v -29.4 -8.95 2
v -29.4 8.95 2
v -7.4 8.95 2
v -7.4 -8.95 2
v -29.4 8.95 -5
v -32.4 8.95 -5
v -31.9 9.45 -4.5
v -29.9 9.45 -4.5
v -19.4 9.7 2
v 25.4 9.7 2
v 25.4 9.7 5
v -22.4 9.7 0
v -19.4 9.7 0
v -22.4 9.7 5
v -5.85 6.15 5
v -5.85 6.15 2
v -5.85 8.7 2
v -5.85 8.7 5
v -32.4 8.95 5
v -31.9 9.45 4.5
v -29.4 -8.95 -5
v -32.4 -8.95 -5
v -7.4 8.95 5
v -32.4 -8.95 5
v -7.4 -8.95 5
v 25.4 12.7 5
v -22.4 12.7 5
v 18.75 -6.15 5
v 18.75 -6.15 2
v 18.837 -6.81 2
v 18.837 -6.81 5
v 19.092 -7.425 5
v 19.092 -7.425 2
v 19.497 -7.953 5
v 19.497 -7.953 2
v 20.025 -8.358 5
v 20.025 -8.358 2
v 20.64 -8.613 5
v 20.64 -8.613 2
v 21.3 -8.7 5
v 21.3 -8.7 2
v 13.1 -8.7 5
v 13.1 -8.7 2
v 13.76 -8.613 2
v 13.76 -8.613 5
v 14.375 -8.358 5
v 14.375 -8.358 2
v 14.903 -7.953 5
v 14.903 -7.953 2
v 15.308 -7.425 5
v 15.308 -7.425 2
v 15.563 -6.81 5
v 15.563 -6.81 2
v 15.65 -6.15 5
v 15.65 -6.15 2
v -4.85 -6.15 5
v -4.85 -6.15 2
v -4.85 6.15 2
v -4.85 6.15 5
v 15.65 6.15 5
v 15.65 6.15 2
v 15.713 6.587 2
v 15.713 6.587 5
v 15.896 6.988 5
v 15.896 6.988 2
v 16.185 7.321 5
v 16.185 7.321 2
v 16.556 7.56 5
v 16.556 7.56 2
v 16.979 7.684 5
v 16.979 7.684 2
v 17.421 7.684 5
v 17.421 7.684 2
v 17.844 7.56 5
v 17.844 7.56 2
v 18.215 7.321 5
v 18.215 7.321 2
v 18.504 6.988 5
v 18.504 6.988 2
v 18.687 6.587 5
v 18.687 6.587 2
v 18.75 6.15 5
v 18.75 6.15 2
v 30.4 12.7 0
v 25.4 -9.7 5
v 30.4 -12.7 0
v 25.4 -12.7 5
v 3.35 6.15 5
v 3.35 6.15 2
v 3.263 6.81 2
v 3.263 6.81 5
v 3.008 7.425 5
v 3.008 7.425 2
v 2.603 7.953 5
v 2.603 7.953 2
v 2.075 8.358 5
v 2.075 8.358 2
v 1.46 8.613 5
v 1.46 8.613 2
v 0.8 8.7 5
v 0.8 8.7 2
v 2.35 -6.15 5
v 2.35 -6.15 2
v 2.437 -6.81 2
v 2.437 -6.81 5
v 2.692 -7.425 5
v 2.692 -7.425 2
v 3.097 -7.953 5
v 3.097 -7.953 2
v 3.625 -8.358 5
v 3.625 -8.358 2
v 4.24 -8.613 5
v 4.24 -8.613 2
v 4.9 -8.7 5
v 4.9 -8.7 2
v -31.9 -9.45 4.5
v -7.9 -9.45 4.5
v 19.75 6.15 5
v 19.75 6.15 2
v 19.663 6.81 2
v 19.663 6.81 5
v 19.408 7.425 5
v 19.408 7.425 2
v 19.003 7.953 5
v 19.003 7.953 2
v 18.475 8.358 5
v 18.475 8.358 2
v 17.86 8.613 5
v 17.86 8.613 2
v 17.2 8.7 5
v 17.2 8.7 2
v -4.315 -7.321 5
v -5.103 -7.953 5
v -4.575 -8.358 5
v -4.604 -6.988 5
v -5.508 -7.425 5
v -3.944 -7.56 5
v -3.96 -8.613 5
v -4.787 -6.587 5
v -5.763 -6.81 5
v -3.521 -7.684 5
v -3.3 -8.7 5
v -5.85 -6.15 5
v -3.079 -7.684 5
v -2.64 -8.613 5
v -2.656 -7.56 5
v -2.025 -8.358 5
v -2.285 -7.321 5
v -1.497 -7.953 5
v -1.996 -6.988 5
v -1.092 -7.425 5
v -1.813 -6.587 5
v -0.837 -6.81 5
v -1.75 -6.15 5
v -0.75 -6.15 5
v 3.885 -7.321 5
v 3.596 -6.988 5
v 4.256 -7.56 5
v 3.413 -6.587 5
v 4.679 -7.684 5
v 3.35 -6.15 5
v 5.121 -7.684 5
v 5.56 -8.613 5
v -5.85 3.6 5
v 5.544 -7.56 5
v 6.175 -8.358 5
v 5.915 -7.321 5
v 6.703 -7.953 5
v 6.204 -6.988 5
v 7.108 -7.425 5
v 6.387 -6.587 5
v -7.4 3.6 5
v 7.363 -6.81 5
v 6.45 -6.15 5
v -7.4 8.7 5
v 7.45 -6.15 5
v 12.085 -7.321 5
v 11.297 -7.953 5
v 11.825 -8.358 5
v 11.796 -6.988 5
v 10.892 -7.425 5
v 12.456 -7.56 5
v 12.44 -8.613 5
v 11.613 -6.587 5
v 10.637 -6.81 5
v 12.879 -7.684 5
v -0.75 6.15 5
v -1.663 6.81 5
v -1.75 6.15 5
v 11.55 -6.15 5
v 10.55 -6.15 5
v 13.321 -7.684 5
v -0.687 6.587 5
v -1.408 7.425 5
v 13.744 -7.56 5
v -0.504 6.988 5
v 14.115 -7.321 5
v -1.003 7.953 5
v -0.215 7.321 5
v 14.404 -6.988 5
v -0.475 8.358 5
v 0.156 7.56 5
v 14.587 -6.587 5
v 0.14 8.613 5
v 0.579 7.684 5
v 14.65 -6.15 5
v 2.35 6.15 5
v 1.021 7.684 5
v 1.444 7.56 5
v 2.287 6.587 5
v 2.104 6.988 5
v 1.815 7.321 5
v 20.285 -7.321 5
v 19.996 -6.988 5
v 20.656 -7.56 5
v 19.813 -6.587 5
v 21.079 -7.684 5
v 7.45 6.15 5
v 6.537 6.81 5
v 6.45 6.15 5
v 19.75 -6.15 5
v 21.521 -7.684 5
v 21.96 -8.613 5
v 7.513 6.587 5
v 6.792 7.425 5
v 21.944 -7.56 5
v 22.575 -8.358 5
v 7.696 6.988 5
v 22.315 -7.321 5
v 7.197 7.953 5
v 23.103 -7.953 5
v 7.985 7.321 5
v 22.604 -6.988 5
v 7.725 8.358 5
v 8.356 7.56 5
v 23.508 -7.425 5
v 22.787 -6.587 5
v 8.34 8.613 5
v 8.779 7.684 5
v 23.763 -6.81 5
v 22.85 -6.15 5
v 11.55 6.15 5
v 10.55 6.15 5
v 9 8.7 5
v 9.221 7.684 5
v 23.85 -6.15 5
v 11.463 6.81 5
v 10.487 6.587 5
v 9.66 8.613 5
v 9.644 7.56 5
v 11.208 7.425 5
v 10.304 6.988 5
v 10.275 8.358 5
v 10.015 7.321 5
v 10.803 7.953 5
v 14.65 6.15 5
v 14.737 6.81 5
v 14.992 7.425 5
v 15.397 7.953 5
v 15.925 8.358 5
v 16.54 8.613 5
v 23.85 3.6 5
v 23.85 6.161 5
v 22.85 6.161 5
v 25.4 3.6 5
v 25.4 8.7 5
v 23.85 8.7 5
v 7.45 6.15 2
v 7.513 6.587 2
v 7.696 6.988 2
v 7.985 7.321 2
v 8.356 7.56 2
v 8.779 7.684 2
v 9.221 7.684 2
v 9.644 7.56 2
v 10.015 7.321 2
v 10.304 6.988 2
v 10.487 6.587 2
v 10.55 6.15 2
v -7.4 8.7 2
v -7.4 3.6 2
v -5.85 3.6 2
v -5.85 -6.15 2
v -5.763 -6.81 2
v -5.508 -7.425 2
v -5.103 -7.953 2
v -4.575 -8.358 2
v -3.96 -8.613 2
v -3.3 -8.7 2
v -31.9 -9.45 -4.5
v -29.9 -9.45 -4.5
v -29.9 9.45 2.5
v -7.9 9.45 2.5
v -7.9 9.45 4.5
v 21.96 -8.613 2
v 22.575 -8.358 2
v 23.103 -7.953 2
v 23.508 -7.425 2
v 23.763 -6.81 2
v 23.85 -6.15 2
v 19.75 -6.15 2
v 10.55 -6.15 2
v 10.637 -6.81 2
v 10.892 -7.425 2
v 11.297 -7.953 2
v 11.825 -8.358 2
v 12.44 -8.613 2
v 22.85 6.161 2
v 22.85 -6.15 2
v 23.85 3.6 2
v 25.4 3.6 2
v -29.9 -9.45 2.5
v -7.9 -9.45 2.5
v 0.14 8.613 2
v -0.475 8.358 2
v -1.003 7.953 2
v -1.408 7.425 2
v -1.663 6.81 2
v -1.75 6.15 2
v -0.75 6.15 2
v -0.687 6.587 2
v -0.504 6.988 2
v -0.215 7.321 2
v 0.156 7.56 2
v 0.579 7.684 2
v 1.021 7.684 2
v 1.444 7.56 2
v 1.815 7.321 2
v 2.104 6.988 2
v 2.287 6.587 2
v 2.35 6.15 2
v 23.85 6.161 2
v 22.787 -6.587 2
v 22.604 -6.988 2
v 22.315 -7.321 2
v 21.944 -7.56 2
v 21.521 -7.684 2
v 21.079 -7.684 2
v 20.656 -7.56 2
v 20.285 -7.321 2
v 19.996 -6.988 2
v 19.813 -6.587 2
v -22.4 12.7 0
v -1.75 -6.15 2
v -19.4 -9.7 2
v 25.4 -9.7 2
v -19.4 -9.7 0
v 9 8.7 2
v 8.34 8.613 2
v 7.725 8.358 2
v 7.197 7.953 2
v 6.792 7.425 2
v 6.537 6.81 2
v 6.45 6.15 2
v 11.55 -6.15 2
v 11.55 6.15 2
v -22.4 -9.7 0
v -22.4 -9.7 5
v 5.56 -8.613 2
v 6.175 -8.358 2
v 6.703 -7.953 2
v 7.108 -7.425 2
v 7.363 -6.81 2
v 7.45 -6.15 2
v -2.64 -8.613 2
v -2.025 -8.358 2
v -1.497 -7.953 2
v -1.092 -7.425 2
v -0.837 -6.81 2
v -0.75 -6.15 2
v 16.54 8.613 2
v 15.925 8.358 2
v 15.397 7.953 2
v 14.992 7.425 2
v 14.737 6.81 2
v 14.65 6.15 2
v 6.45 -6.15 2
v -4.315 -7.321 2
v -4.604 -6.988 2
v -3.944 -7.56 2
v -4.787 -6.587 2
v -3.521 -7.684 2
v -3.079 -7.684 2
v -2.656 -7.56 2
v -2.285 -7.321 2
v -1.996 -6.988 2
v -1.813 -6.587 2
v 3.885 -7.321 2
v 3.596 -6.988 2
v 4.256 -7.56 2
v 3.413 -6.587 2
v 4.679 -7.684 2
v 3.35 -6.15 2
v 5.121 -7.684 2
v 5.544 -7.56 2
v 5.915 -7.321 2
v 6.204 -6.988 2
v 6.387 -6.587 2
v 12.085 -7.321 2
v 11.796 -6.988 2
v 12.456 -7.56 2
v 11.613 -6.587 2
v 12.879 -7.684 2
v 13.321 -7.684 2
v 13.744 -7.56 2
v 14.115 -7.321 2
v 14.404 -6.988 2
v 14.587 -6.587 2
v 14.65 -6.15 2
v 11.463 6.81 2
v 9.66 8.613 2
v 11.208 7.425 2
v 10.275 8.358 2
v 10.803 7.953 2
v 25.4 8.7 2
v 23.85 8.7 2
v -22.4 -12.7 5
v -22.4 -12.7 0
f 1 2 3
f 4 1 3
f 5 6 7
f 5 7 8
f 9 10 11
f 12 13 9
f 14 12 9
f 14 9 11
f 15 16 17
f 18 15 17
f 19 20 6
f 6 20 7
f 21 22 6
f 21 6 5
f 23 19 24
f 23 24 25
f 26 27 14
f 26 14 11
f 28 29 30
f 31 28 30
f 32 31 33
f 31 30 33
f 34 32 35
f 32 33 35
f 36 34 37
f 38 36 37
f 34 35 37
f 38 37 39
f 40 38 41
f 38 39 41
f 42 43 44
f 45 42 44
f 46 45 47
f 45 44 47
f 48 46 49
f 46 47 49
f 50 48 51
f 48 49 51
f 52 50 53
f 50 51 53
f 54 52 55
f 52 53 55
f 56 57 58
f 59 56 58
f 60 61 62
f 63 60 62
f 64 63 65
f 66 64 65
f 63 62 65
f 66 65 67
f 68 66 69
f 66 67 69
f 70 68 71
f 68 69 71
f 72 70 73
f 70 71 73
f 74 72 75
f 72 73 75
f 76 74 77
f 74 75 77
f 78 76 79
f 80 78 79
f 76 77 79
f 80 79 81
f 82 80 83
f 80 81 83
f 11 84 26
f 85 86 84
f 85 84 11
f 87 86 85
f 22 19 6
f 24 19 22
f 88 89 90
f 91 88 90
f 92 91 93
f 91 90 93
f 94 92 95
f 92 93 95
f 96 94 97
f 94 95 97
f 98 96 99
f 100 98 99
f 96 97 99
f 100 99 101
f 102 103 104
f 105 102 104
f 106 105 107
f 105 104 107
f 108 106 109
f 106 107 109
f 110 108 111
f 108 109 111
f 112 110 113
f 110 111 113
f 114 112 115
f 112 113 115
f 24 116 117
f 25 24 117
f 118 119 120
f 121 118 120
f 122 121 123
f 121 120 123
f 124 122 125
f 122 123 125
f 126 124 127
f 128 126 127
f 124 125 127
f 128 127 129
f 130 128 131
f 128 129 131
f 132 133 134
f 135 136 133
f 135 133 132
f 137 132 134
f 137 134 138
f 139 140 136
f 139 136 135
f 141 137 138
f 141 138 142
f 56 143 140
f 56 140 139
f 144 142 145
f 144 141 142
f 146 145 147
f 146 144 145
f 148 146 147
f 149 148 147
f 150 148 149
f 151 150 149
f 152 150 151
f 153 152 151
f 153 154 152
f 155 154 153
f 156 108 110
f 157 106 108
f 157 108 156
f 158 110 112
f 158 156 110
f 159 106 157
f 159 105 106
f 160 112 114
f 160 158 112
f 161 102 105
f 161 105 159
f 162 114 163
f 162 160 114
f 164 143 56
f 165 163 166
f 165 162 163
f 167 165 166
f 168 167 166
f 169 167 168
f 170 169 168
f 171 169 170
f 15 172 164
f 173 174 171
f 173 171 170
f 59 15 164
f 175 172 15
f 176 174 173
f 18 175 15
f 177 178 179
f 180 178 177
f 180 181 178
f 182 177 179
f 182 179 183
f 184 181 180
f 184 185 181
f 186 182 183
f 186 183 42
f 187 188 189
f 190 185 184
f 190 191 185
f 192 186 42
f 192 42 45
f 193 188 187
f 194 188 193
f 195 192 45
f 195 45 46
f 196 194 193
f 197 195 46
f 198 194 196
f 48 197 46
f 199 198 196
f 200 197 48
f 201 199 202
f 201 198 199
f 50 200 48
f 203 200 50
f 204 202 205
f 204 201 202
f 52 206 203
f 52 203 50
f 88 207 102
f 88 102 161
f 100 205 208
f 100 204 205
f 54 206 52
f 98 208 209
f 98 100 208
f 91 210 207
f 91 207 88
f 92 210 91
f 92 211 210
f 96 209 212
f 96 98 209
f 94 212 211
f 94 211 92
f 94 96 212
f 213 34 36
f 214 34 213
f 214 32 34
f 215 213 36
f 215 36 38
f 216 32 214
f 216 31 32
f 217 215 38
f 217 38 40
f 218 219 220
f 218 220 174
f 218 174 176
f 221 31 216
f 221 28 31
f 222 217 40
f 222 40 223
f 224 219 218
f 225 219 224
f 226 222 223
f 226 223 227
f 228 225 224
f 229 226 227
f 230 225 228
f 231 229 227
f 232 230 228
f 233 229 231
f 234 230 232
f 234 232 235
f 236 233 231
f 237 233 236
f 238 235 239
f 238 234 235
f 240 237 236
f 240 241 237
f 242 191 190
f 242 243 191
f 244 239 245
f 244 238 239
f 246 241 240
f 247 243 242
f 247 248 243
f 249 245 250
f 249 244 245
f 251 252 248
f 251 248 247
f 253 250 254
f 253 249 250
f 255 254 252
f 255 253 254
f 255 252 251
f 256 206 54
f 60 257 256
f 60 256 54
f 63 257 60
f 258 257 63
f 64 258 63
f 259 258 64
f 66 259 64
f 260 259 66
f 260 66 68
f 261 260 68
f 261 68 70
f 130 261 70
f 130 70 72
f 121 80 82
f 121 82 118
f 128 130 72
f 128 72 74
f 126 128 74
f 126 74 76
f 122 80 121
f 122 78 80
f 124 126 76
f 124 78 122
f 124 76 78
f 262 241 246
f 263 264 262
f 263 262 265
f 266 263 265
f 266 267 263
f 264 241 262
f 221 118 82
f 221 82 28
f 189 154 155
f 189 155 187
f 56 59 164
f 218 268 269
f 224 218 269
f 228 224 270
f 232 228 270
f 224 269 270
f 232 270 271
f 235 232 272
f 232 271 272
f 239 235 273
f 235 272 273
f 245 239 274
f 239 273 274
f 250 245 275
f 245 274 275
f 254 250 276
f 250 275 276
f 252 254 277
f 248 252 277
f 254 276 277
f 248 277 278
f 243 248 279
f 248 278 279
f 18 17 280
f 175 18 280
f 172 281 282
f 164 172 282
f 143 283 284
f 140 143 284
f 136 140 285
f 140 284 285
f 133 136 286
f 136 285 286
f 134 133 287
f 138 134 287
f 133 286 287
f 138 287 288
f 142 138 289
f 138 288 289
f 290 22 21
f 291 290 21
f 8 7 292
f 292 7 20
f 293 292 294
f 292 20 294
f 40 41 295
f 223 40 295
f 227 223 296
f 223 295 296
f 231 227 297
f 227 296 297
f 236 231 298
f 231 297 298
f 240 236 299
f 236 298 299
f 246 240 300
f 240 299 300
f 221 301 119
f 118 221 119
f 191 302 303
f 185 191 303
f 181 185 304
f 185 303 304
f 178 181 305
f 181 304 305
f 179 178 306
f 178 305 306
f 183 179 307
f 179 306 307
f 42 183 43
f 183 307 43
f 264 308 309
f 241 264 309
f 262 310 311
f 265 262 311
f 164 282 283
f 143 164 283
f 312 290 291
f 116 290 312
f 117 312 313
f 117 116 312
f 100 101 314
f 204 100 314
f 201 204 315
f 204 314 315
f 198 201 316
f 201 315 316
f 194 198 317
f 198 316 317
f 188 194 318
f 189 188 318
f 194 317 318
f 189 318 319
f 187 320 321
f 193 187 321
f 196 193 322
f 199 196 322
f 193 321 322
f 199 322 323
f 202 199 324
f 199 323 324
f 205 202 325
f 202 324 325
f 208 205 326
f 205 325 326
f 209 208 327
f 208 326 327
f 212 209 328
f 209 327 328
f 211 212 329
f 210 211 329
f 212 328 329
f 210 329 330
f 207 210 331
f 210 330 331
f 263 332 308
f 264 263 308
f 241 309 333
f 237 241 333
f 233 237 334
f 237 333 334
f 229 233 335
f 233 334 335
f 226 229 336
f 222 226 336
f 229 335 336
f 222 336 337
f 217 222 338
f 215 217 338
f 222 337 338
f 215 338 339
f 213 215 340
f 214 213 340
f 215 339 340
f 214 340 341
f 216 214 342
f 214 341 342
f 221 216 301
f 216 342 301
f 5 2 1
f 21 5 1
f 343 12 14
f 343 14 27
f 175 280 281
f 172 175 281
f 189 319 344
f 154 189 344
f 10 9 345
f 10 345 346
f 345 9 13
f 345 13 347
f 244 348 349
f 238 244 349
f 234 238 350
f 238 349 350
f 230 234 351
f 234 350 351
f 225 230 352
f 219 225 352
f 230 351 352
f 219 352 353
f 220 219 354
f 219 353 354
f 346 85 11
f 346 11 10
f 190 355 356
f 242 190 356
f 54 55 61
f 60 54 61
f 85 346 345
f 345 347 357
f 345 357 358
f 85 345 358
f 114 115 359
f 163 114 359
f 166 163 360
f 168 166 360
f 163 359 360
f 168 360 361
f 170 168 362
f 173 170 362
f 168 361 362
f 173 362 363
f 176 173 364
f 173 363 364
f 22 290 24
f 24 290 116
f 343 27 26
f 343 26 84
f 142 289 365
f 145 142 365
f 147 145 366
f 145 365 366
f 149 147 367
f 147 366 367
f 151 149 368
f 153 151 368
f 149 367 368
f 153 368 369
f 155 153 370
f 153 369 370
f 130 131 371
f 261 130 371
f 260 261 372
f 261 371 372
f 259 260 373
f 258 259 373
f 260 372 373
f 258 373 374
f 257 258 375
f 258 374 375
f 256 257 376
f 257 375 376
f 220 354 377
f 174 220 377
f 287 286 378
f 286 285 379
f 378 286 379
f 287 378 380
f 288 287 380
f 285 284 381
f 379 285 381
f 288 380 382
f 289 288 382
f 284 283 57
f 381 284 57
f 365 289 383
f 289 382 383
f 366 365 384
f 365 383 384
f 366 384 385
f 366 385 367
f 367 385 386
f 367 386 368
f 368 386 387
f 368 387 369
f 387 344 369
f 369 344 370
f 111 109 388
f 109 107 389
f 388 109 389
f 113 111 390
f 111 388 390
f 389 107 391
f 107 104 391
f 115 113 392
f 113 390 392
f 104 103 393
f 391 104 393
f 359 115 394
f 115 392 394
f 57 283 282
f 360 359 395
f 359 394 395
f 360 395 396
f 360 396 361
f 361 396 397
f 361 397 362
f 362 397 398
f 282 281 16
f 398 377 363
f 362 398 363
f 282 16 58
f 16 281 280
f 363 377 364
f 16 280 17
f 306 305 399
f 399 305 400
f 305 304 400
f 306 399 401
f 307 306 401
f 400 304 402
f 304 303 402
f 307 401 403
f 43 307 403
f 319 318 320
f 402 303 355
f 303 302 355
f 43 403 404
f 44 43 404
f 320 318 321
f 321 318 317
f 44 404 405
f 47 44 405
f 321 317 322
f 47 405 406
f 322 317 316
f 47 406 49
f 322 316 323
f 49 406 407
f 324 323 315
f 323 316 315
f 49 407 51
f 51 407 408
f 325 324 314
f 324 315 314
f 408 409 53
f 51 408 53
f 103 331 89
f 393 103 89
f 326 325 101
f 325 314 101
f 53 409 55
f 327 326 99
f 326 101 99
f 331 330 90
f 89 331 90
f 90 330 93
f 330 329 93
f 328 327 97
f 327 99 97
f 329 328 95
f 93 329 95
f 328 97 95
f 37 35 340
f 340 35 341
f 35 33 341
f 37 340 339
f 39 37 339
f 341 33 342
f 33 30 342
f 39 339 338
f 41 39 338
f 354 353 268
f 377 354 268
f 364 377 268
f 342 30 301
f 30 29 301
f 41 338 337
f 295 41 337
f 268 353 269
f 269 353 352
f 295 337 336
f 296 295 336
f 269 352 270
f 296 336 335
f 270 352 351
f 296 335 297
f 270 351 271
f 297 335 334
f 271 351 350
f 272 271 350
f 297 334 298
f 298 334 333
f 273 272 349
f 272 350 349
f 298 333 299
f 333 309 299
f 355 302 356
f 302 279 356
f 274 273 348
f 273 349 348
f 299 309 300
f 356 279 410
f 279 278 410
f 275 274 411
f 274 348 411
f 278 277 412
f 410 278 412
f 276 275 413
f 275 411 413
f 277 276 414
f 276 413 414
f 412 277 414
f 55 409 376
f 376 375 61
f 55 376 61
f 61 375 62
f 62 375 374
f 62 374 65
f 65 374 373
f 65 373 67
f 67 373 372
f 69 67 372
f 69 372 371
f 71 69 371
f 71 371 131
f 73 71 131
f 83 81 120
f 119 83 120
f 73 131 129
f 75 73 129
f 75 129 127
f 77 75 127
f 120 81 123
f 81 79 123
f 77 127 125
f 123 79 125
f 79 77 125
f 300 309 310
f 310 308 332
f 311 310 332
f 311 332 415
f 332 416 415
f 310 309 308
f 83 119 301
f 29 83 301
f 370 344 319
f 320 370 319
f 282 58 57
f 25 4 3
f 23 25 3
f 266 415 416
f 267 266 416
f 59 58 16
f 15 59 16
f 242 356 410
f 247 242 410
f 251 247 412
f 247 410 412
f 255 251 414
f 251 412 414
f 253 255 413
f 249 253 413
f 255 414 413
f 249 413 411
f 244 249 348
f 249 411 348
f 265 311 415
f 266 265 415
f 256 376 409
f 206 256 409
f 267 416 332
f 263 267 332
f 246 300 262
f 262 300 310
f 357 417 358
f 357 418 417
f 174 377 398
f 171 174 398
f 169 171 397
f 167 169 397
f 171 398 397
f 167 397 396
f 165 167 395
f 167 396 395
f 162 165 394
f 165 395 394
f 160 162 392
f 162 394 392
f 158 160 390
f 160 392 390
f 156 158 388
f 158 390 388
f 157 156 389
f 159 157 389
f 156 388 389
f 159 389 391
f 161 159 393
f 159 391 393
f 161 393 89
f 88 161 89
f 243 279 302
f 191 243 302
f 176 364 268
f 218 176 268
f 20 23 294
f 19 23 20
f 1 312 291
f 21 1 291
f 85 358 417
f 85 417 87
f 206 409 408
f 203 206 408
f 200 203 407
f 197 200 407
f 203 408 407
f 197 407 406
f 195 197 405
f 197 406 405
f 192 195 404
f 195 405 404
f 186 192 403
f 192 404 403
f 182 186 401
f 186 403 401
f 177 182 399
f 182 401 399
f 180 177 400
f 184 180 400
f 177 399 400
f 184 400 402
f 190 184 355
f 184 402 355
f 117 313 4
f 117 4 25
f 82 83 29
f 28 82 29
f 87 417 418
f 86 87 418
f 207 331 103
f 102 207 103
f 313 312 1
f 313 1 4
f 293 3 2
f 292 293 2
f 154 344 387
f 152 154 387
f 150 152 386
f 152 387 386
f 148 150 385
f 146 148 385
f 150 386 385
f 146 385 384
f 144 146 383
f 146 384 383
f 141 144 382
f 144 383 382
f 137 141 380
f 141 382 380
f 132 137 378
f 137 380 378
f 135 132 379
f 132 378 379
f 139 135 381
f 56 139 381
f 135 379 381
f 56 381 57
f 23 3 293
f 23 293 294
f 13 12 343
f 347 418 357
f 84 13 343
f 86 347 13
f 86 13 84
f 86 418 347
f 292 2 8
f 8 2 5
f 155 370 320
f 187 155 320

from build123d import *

# Parameters (mm, degrees)
F0_W      = 50.8
F0_H      = 25.4
F1_DEPTH  = 2
F2_W      = 50.8
F2_H      = 3
F3_DEPTH  = 3
F5_DEPTH  = 25.4
F6_DEPTH  = 3
F7_W      = 19.4
F7_H      = 2
F8_DEPTH  = 3
F9_W      = 13
F9_H      = 18.9
F9_W_2    = 12
F10_DEPTH = 3
F11_W     = 3
F11_H     = 18.9
F12_DEPTH = 7
F14_DEPTH = 3
F15_SIZE  = 0.5


with BuildPart() as f1:
    # F0 (on Top) → F1 (new body)
    with BuildSketch(Plane.XY):
        Rectangle(F0_W, F0_H)
    extrude(amount=F1_DEPTH)

    # F2 (on face) → F3 (join)
    with BuildSketch(Plane.XY.offset(2)):
        with Locations((0, 11.2)):
            Rectangle(F2_W, F2_H)
        with Locations((0, -11.2)):
            Rectangle(F2_W, F2_H)
    extrude(amount=F3_DEPTH)

    # F4 (on face) → F5 (join)
    with BuildSketch(Plane.XZ.offset(12.7)):
        Polygon((30.4, 0), (25.4, 5), (25.4, 0), align=None)
    extrude(amount=-F5_DEPTH)

    # F6 (cut): a face of the model
    f6_faces = [f1.faces().sort_by_distance(p)[0] for p in [
        (-25.4, 0, 1.6540697674),
    ]]
    extrude(f6_faces, amount=-F6_DEPTH, mode=Mode.SUBTRACT)

    # F7 (on face) → F8 (cut)
    with BuildSketch(Plane(origin=(-22.4, 0, 0), x_dir=(0, -1, 0), z_dir=(-1, 0, 0))):
        with Locations((0, 1)):
            Rectangle(F7_W, F7_H)
    extrude(amount=-F8_DEPTH, mode=Mode.SUBTRACT)


with BuildPart() as f10:
    # F9 (on face) → F10 (new body)
    with BuildSketch(Plane.XY.offset(2)):
        with Locations((-25.9, 0)):
            Rectangle(F9_W, F9_H)
        with Locations((-13.4, 0)):
            Rectangle(F9_W_2, F9_H)
    extrude(amount=F10_DEPTH)

    # F11 (on face) → F12 (join)
    with BuildSketch(Plane(origin=(0, 0, 2), x_dir=(1, 0, 0), z_dir=(0, 0, -1))):
        with Locations((-30.9, 0)):
            Rectangle(F11_W, F11_H)
    extrude(amount=F12_DEPTH)

    # F15
    f15_edges = [f10.edges().sort_by_distance(p)[0] for p in [
        (-7.4, 9.45, 3.5),
        (-19.9, 9.45, 5),
        (-32.4, 9.45, 0),
        (-30.9, 9.45, -5),
        (-29.4, 9.45, -1.5),
        (-18.4, 9.45, 2),
        (-19.9, -9.45, 5),
        (-7.4, -9.45, 3.5),
        (-18.4, -9.45, 2),
        (-29.4, -9.45, -1.5),
        (-30.9, -9.45, -5),
        (-32.4, -9.45, 0),
    ]]
    chamfer(f15_edges, length=F15_SIZE)


with BuildPart() as f14:
    # F13 (on face) → F14 (new body)
    with BuildSketch(Plane.XY.offset(2)):
        Polygon((-7.4, 8.7), (-7.4, 3.6), (-5.85, 3.6), (-5.85, 6.15), (-5.85, 8.7), align=None)
        with BuildLine():
            Line((-5.85, 3.6), (-5.85, -6.15))
            ThreePointArc((-5.85, -6.15), (-5.586372673, -5.0208410209), (-4.85, -4.1251543269))
            Line((-4.85, -4.1251543269), (-4.85, 6.15))
            Line((-4.85, 6.15), (-5.85, 6.15))
            Line((-5.85, 6.15), (-5.85, 3.6))
        make_face()
        with BuildLine():
            ThreePointArc((-1.75, -4.1251543269), (-1.013627327, -5.0208410209), (-0.75, -6.15))
            Line((-0.75, -6.15), (-0.75, 4.1251543269))
            ThreePointArc((-0.75, 4.1251543269), (-1.486372673, 5.0208410209), (-1.75, 6.15))
            Line((-1.75, 6.15), (-1.75, -4.1251543269))
        make_face()
        with BuildLine():
            ThreePointArc((-4.85, -4.1251543269), (-5.586372673, -5.0208410209), (-5.85, -6.15))
            Line((-5.85, -6.15), (-4.85, -6.15))
            Line((-4.85, -6.15), (-4.85, -4.1251543269))
        make_face()
        with BuildLine():
            Line((-1.75, -6.15), (-0.75, -6.15))
            ThreePointArc((-0.75, -6.15), (-1.013627327, -5.0208410209), (-1.75, -4.1251543269))
            Line((-1.75, -4.1251543269), (-1.75, -6.15))
        make_face()
        with BuildLine():
            ThreePointArc((-5.85, -6.15), (-5.103122288, -7.9531222961), (-3.2999999885, -8.7))
            ThreePointArc((-3.2999999885, -8.7), (-1.4968777039, -7.953122288), (-0.75, -6.15))
            Line((-0.75, -6.15), (-1.75, -6.15))
            ThreePointArc((-1.75, -6.15), (-3.3, -7.7), (-4.85, -6.15))
            Line((-4.85, -6.15), (-5.85, -6.15))
        make_face()
        with BuildLine():
            Line((2.35, 6.15), (3.35, 6.15))
            ThreePointArc((3.35, 6.15), (2.603122292, 7.953122292), (0.8, 8.7))
            ThreePointArc((0.8, 8.7), (-1.003122292, 7.953122292), (-1.75, 6.15))
            Line((-1.75, 6.15), (-0.75, 6.15))
            ThreePointArc((-0.75, 6.15), (0.8, 7.7), (2.35, 6.15))
        make_face()
        with BuildLine():
            ThreePointArc((-1.75, 6.15), (-1.486372673, 5.0208410209), (-0.75, 4.1251543269))
            Line((-0.75, 4.1251543269), (-0.75, 6.15))
            Line((-0.75, 6.15), (-1.75, 6.15))
        make_face()
        with BuildLine():
            Line((2.35, 6.15), (2.35, 4.1251543269))
            ThreePointArc((2.35, 4.1251543269), (3.086372673, 5.0208410209), (3.35, 6.15))
            Line((3.35, 6.15), (2.35, 6.15))
        make_face()
        with BuildLine():
            Line((2.35, 4.1251543269), (2.35, -6.15))
            ThreePointArc((2.35, -6.15), (2.613627327, -5.0208410209), (3.35, -4.1251543269))
            Line((3.35, -4.1251543269), (3.35, 6.15))
            ThreePointArc((3.35, 6.15), (3.086372673, 5.0208410209), (2.35, 4.1251543269))
        make_face()
        with BuildLine():
            ThreePointArc((2.35, -6.15), (3.096877708, -7.953122292), (4.9, -8.7))
            ThreePointArc((4.9, -8.7), (6.703122292, -7.953122292), (7.45, -6.15))
            Line((7.45, -6.15), (6.45, -6.15))
            ThreePointArc((6.45, -6.15), (4.9, -7.7), (3.35, -6.15))
            Line((3.35, -6.15), (2.35, -6.15))
        make_face()
        with BuildLine():
            ThreePointArc((6.45, -4.1251543269), (7.186372673, -5.0208410209), (7.45, -6.15))
            Line((7.45, -6.15), (7.45, 4.1251543269))
            ThreePointArc((7.45, 4.1251543269), (6.713627327, 5.0208410209), (6.45, 6.15))
            Line((6.45, 6.15), (6.45, -4.1251543269))
        make_face()
        with BuildLine():
            Line((10.55, 6.15), (11.55, 6.15))
            ThreePointArc((11.55, 6.15), (10.803122292, 7.953122292), (9, 8.7))
            ThreePointArc((9, 8.7), (7.196877708, 7.953122292), (6.45, 6.15))
            Line((6.45, 6.15), (7.45, 6.15))
            ThreePointArc((7.45, 6.15), (9, 7.7), (10.55, 6.15))
        make_face()
        with BuildLine():
            ThreePointArc((6.45, 6.15), (6.713627327, 5.0208410209), (7.45, 4.1251543269))
            Line((7.45, 4.1251543269), (7.45, 6.15))
            Line((7.45, 6.15), (6.45, 6.15))
        make_face()
        with BuildLine():
            ThreePointArc((3.35, -4.1251543269), (2.613627327, -5.0208410209), (2.35, -6.15))
            Line((2.35, -6.15), (3.35, -6.15))
            Line((3.35, -6.15), (3.35, -4.1251543269))
        make_face()
        with BuildLine():
            Line((6.45, -6.15), (7.45, -6.15))
            ThreePointArc((7.45, -6.15), (7.186372673, -5.0208410209), (6.45, -4.1251543269))
            Line((6.45, -4.1251543269), (6.45, -6.15))
        make_face()
        with BuildLine():
            Line((10.55, 6.15), (10.55, 4.1251543269))
            ThreePointArc((10.55, 4.1251543269), (11.286372673, 5.0208410209), (11.55, 6.15))
            Line((11.55, 6.15), (10.55, 6.15))
        make_face()
        with BuildLine():
            Line((10.55, 4.1251543269), (10.55, -6.15))
            ThreePointArc((10.55, -6.15), (10.813627327, -5.0208410209), (11.55, -4.1251543269))
            Line((11.55, -4.1251543269), (11.55, 6.15))
            ThreePointArc((11.55, 6.15), (11.286372673, 5.0208410209), (10.55, 4.1251543269))
        make_face()
        with BuildLine():
            ThreePointArc((10.55, -6.15), (11.296877708, -7.953122292), (13.1, -8.7))
            ThreePointArc((13.1, -8.7), (14.903122292, -7.953122292), (15.65, -6.15))
            Line((15.65, -6.15), (14.65, -6.15))
            ThreePointArc((14.65, -6.15), (13.1, -7.7), (11.55, -6.15))
            Line((11.55, -6.15), (10.55, -6.15))
        make_face()
        with BuildLine():
            ThreePointArc((11.55, -4.1251543269), (10.813627327, -5.0208410209), (10.55, -6.15))
            Line((10.55, -6.15), (11.55, -6.15))
            Line((11.55, -6.15), (11.55, -4.1251543269))
        make_face()
        with BuildLine():
            Line((14.65, -6.15), (15.65, -6.15))
            ThreePointArc((15.65, -6.15), (15.386372673, -5.0208410209), (14.65, -4.1251543269))
            Line((14.65, -4.1251543269), (14.65, -6.15))
        make_face()
        with BuildLine():
            ThreePointArc((14.65, -4.1251543269), (15.386372673, -5.0208410209), (15.65, -6.15))
            Line((15.65, -6.15), (15.65, 4.1251543269))
            ThreePointArc((15.65, 4.1251543269), (14.913627327, 5.0208410209), (14.65, 6.15))
            Line((14.65, 6.15), (14.65, -4.1251543269))
        make_face()
        with BuildLine():
            ThreePointArc((14.65, 6.15), (14.913627327, 5.0208410209), (15.65, 4.1251543269))
            Line((15.65, 4.1251543269), (15.65, 6.15))
            Line((15.65, 6.15), (14.65, 6.15))
        make_face()
        with BuildLine():
            Line((18.75, 6.15), (18.75, 4.1251543269))
            ThreePointArc((18.75, 4.1251543269), (19.486372673, 5.0208410209), (19.75, 6.15))
            Line((19.75, 6.15), (18.75, 6.15))
        make_face()
        with BuildLine():
            Line((18.75, 6.15), (19.75, 6.15))
            ThreePointArc((19.75, 6.15), (19.003122292, 7.953122292), (17.2, 8.7))
            ThreePointArc((17.2, 8.7), (15.396877708, 7.953122292), (14.65, 6.15))
            Line((14.65, 6.15), (15.65, 6.15))
            ThreePointArc((15.65, 6.15), (17.2, 7.7), (18.75, 6.15))
        make_face()
        Polygon((23.85, 3.6), (25.4, 3.6), (25.4, 8.7), (23.85, 8.7), (23.85, 6.160621997), align=None)
        with BuildLine():
            Line((18.75, 4.1251543269), (18.75, -6.15))
            ThreePointArc((18.75, -6.15), (19.013627327, -5.0208410209), (19.75, -4.1251543269))
            Line((19.75, -4.1251543269), (19.75, 6.15))
            ThreePointArc((19.75, 6.15), (19.486372673, 5.0208410209), (18.75, 4.1251543269))
        make_face()
        with BuildLine():
            ThreePointArc((19.75, -4.1251543269), (19.013627327, -5.0208410209), (18.75, -6.15))
            Line((18.75, -6.15), (19.75, -6.15))
            Line((19.75, -6.15), (19.75, -4.1251543269))
        make_face()
        with BuildLine():
            Line((22.85, -6.15), (23.85, -6.15))
            ThreePointArc((23.85, -6.15), (23.586372673, -5.0208410209), (22.85, -4.1251543269))
            Line((22.85, -4.1251543269), (22.85, -6.15))
        make_face()
        with BuildLine():
            ThreePointArc((18.75, -6.15), (19.496877708, -7.953122292), (21.3, -8.7))
            ThreePointArc((21.3, -8.7), (23.103122292, -7.953122292), (23.85, -6.15))
            Line((23.85, -6.15), (22.85, -6.15))
            ThreePointArc((22.85, -6.15), (21.3, -7.7), (19.75, -6.15))
            Line((19.75, -6.15), (18.75, -6.15))
        make_face()
        with BuildLine():
            ThreePointArc((22.85, -4.1251543269), (23.586372673, -5.0208410209), (23.85, -6.15))
            Line((23.85, -6.15), (23.85, 3.6))
            Line((23.85, 3.6), (23.85, 6.160621997))
            Line((23.85, 6.160621997), (22.85, 6.160621997))
            Line((22.85, 6.160621997), (22.85, -4.1251543269))
        make_face()
    extrude(amount=F14_DEPTH)


solid = Compound([f1.part, f10.part, f14.part])
